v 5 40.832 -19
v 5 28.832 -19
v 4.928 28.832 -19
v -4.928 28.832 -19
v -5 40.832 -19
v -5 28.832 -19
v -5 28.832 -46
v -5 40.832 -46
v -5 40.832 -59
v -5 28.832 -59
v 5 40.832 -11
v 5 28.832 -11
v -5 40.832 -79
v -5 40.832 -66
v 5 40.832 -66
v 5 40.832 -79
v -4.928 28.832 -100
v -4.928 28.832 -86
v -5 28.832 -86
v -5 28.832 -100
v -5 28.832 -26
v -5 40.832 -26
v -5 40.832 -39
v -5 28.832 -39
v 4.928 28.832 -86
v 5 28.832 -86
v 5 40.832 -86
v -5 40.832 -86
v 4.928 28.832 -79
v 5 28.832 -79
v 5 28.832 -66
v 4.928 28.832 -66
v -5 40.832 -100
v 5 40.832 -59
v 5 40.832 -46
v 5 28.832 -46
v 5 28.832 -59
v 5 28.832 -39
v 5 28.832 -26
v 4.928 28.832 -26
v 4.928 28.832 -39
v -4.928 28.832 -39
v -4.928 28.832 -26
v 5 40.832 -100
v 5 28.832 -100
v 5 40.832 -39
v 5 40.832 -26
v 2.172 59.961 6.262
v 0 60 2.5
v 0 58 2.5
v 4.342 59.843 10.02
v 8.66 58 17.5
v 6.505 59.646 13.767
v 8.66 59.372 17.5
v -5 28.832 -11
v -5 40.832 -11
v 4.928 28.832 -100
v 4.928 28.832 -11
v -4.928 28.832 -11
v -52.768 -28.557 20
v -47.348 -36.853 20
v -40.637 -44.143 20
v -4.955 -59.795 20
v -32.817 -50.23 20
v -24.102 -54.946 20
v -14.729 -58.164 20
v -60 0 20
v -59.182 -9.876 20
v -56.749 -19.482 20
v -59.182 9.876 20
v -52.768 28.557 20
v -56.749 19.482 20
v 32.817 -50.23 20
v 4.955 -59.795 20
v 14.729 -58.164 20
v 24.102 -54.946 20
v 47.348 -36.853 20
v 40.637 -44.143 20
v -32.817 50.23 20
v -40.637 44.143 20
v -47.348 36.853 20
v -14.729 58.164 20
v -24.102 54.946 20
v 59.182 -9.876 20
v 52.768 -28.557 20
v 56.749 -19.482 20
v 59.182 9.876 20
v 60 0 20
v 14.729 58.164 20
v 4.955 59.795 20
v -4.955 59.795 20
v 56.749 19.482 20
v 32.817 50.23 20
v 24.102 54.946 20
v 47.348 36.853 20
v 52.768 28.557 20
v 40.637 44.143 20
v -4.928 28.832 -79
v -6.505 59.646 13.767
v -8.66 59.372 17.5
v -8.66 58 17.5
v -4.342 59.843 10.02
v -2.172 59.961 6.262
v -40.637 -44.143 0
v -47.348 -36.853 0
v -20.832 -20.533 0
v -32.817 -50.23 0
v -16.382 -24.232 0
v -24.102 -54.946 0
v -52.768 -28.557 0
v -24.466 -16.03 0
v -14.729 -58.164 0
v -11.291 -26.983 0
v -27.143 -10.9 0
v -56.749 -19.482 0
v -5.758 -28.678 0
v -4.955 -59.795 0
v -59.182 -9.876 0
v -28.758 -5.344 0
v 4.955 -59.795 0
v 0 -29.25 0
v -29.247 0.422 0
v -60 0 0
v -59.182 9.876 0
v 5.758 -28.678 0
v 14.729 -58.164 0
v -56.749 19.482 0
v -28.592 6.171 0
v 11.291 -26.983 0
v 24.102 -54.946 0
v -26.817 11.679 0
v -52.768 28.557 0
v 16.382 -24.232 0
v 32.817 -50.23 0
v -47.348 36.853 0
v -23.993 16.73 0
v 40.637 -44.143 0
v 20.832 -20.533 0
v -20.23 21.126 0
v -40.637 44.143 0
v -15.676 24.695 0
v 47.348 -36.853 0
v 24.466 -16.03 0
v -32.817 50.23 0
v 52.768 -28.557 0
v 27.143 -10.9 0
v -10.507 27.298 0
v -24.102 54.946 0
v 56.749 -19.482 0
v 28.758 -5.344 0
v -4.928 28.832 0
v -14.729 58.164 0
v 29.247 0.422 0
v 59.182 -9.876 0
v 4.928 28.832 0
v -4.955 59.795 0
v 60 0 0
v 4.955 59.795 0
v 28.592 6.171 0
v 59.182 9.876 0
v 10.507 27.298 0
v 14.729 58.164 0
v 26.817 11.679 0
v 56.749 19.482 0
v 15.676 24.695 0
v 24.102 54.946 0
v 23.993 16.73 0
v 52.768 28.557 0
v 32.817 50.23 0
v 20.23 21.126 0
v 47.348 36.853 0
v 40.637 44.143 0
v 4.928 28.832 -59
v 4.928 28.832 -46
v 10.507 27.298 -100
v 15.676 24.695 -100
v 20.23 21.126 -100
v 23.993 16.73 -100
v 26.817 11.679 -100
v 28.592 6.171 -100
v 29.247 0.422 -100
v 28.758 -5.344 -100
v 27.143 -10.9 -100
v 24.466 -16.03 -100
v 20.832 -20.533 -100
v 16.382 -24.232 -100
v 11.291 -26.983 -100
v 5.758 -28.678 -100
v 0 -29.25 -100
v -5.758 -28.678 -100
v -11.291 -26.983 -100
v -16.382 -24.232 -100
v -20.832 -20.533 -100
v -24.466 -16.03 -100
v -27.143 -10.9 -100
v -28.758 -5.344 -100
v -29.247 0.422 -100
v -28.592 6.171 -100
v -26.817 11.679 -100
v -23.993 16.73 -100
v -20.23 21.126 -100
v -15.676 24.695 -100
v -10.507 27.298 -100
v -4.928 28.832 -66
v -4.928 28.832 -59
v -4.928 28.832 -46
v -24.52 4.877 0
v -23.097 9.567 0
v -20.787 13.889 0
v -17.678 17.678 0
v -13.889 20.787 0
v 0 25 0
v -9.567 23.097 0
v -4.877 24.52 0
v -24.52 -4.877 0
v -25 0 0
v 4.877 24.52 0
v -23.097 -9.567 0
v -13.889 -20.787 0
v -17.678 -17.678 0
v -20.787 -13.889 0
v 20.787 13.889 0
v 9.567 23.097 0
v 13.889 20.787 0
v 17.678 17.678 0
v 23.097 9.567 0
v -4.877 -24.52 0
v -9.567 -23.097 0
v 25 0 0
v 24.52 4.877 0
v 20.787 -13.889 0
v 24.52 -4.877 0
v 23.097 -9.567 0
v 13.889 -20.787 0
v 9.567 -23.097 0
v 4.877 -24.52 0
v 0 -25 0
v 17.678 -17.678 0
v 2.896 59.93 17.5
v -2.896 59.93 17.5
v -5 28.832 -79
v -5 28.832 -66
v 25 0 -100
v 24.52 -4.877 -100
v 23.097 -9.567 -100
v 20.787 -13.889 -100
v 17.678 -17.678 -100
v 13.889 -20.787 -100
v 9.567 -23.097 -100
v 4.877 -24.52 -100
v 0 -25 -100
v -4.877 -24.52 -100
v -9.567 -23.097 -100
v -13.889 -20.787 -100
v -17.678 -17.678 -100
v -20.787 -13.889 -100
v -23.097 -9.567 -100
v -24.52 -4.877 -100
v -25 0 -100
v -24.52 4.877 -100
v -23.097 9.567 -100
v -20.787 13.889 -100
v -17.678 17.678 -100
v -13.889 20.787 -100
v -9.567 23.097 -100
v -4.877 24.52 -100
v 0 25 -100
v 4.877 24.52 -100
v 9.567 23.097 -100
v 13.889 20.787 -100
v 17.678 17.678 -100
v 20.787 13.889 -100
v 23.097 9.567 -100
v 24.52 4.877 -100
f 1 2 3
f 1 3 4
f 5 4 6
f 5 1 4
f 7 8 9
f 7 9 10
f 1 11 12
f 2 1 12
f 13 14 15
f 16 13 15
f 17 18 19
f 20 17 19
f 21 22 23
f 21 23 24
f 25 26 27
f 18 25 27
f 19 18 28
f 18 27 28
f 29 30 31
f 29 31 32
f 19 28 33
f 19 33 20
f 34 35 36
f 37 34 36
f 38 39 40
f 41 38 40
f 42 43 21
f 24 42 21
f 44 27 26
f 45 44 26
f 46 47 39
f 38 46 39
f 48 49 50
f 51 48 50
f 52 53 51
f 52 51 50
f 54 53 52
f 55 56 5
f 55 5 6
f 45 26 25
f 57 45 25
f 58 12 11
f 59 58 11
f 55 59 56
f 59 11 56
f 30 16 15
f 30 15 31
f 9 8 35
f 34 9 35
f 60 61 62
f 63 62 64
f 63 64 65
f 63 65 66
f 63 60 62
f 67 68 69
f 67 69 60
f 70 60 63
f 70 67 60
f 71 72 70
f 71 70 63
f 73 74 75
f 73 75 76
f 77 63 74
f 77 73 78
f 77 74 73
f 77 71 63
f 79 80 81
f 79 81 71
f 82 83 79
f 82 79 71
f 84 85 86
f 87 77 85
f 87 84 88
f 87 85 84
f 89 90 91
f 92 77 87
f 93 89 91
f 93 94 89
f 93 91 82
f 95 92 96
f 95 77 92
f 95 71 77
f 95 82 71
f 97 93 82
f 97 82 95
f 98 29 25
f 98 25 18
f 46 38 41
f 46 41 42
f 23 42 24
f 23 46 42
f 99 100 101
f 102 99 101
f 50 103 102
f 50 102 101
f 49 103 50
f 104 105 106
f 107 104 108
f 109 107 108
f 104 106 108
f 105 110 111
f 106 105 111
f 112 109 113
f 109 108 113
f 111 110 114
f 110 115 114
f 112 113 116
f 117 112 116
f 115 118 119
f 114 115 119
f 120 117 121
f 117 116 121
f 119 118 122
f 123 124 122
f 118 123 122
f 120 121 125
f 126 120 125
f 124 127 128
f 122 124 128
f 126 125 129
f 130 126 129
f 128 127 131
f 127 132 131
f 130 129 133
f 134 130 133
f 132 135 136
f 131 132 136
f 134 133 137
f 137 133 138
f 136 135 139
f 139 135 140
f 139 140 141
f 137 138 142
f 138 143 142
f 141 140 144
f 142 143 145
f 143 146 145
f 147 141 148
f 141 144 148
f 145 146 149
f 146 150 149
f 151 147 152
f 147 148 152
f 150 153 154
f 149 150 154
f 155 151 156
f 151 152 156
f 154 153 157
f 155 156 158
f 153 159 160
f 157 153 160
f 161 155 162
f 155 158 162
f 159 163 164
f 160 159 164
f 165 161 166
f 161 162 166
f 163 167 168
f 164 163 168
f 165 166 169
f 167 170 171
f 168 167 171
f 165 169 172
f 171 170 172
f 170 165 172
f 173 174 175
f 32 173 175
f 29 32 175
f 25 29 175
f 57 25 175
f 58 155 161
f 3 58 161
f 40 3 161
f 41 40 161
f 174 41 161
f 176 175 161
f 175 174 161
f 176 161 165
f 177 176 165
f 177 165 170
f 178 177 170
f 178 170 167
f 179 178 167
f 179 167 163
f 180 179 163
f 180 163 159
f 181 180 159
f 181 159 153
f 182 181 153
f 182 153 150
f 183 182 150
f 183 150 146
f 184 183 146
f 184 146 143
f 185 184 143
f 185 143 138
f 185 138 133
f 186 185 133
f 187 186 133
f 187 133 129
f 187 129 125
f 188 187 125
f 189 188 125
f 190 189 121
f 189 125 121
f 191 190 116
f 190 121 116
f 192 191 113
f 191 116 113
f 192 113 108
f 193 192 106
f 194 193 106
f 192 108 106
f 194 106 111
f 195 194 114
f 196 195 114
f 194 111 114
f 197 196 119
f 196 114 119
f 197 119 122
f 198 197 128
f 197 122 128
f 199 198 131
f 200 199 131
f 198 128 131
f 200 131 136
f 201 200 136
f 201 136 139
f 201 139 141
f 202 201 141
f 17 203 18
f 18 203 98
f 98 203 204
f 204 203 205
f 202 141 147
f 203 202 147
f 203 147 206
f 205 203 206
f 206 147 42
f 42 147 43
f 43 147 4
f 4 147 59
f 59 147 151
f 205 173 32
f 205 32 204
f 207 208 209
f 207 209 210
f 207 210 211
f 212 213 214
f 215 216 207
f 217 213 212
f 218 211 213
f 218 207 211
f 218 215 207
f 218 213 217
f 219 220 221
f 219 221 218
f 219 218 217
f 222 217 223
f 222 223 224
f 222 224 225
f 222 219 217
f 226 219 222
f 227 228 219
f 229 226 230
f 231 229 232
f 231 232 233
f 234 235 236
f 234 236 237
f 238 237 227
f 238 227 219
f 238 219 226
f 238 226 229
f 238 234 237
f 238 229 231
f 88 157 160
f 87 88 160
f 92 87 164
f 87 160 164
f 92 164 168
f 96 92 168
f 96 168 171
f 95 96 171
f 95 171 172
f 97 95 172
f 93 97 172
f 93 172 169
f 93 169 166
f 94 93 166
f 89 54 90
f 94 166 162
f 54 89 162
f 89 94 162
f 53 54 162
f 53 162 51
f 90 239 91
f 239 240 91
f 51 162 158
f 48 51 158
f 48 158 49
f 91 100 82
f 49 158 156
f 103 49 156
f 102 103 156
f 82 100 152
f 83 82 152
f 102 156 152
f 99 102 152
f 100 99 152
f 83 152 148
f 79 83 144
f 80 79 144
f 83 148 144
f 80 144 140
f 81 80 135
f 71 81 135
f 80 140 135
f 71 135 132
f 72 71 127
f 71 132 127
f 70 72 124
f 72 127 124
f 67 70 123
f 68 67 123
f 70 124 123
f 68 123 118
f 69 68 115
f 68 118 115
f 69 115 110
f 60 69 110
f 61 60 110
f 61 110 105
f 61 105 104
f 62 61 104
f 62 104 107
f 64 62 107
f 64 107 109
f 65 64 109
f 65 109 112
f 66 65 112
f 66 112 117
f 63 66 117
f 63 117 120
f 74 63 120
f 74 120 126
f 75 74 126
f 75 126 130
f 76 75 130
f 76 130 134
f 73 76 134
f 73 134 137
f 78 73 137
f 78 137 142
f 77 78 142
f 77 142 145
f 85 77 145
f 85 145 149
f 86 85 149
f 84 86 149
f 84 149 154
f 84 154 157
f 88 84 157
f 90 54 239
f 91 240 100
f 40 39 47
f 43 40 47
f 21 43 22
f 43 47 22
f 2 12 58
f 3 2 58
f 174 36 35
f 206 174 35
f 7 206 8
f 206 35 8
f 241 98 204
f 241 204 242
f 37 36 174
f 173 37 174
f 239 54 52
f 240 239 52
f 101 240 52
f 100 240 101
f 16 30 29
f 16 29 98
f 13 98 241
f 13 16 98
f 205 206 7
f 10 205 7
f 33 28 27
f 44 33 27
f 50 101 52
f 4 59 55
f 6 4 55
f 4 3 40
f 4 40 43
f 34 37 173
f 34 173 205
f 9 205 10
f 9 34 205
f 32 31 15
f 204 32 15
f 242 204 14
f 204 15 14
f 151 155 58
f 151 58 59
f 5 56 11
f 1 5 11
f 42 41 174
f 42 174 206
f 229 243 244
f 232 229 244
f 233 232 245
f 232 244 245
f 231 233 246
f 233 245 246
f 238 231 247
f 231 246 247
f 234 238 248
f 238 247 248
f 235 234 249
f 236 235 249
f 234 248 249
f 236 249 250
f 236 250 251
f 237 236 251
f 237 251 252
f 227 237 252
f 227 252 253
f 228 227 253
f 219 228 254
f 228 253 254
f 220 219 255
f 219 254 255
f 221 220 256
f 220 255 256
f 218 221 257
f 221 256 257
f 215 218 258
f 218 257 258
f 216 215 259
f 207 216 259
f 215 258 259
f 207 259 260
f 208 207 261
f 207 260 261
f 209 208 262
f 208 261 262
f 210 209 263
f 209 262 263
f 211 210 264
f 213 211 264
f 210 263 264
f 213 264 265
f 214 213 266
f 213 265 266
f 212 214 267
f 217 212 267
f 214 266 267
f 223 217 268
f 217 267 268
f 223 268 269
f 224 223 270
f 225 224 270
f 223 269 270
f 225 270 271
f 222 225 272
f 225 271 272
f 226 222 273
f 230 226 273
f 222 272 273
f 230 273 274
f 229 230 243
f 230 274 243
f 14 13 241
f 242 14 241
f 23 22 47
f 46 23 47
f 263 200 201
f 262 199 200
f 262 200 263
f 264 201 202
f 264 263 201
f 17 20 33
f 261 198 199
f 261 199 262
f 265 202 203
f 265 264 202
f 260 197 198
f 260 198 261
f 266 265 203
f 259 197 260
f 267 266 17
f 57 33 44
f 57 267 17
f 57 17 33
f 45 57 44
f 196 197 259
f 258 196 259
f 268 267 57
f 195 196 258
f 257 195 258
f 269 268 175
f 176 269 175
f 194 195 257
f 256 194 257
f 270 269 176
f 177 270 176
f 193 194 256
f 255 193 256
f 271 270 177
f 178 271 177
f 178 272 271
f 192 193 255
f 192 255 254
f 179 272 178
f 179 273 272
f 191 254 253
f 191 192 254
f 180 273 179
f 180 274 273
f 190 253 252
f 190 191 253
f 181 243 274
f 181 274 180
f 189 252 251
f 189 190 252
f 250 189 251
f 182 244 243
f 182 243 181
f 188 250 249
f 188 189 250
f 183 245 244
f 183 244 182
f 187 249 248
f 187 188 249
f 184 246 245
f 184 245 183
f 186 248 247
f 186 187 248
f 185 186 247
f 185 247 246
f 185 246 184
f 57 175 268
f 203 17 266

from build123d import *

# Parameters (mm, degrees)
F0_R      = 60
F1_DEPTH  = 20
F2_R      = 29.25
F3_DEPTH  = 100
F4_R      = 25
F5_DEPTH  = 100
F6_W      = 5
F6_H      = 12
F7_DEPTH  = 100
F8_W      = 10
F8_H      = 7
F8_H_2    = 11
F9_DEPTH  = 12
F12_DEPTH = 2


with BuildPart() as f1:
    # F0 (on Top) → F1 (new body)
    with BuildSketch(Plane.XY):
        Circle(F0_R)
    extrude(amount=F1_DEPTH)

    # F2 (on face) → F3 (join)
    with BuildSketch(Plane(origin=(0, 0, 0), x_dir=(1, 0, 0), z_dir=(0, 0, -1))):
        Circle(F2_R)
    extrude(amount=F3_DEPTH)

    # F4 (on face) → F5 (cut)
    with BuildSketch(Plane(origin=(0, 0, -100), x_dir=(1, 0, 0), z_dir=(0, 0, -1))):
        Circle(F4_R)
    extrude(amount=-F5_DEPTH, mode=Mode.SUBTRACT)

    # F6 (on face) → F7 (join)
    with BuildSketch(Plane(origin=(0, 0, 0), x_dir=(1, 0, 0), z_dir=(0, 0, -1))):
        with Locations((-2.5, -34.831881)):
            Rectangle(F6_W, F6_H)
        with Locations((2.5, -34.831881)):
            Rectangle(F6_W, F6_H)
    extrude(amount=F7_DEPTH)

    # F8 (on face) → F9 (cut)
    with BuildSketch(Plane(origin=(0, 40.831881, 0), x_dir=(-1, 0, 0), z_dir=(0, 1, 0))):
        with Locations((0, -82.5)):
            Rectangle(F8_W, F8_H)
        with Locations((0, -62.5)):
            Rectangle(F8_W, F8_H)
        with Locations((0, -42.5)):
            Rectangle(F8_W, F8_H)
        with Locations((0, -22.5)):
            Rectangle(F8_W, F8_H)
        with Locations((0, -5.5)):
            Rectangle(F8_W, F8_H_2)
    extrude(amount=-F9_DEPTH, mode=Mode.SUBTRACT)

    # F11 (on offset) → F12 (cut)
    with BuildSketch(Plane.XZ.offset(-60)):
        Polygon((-8.660254, 17.5), (0, 2.5), (8.660254, 17.5), align=None)
    extrude(amount=F12_DEPTH, mode=Mode.SUBTRACT)


solid = f1.part
